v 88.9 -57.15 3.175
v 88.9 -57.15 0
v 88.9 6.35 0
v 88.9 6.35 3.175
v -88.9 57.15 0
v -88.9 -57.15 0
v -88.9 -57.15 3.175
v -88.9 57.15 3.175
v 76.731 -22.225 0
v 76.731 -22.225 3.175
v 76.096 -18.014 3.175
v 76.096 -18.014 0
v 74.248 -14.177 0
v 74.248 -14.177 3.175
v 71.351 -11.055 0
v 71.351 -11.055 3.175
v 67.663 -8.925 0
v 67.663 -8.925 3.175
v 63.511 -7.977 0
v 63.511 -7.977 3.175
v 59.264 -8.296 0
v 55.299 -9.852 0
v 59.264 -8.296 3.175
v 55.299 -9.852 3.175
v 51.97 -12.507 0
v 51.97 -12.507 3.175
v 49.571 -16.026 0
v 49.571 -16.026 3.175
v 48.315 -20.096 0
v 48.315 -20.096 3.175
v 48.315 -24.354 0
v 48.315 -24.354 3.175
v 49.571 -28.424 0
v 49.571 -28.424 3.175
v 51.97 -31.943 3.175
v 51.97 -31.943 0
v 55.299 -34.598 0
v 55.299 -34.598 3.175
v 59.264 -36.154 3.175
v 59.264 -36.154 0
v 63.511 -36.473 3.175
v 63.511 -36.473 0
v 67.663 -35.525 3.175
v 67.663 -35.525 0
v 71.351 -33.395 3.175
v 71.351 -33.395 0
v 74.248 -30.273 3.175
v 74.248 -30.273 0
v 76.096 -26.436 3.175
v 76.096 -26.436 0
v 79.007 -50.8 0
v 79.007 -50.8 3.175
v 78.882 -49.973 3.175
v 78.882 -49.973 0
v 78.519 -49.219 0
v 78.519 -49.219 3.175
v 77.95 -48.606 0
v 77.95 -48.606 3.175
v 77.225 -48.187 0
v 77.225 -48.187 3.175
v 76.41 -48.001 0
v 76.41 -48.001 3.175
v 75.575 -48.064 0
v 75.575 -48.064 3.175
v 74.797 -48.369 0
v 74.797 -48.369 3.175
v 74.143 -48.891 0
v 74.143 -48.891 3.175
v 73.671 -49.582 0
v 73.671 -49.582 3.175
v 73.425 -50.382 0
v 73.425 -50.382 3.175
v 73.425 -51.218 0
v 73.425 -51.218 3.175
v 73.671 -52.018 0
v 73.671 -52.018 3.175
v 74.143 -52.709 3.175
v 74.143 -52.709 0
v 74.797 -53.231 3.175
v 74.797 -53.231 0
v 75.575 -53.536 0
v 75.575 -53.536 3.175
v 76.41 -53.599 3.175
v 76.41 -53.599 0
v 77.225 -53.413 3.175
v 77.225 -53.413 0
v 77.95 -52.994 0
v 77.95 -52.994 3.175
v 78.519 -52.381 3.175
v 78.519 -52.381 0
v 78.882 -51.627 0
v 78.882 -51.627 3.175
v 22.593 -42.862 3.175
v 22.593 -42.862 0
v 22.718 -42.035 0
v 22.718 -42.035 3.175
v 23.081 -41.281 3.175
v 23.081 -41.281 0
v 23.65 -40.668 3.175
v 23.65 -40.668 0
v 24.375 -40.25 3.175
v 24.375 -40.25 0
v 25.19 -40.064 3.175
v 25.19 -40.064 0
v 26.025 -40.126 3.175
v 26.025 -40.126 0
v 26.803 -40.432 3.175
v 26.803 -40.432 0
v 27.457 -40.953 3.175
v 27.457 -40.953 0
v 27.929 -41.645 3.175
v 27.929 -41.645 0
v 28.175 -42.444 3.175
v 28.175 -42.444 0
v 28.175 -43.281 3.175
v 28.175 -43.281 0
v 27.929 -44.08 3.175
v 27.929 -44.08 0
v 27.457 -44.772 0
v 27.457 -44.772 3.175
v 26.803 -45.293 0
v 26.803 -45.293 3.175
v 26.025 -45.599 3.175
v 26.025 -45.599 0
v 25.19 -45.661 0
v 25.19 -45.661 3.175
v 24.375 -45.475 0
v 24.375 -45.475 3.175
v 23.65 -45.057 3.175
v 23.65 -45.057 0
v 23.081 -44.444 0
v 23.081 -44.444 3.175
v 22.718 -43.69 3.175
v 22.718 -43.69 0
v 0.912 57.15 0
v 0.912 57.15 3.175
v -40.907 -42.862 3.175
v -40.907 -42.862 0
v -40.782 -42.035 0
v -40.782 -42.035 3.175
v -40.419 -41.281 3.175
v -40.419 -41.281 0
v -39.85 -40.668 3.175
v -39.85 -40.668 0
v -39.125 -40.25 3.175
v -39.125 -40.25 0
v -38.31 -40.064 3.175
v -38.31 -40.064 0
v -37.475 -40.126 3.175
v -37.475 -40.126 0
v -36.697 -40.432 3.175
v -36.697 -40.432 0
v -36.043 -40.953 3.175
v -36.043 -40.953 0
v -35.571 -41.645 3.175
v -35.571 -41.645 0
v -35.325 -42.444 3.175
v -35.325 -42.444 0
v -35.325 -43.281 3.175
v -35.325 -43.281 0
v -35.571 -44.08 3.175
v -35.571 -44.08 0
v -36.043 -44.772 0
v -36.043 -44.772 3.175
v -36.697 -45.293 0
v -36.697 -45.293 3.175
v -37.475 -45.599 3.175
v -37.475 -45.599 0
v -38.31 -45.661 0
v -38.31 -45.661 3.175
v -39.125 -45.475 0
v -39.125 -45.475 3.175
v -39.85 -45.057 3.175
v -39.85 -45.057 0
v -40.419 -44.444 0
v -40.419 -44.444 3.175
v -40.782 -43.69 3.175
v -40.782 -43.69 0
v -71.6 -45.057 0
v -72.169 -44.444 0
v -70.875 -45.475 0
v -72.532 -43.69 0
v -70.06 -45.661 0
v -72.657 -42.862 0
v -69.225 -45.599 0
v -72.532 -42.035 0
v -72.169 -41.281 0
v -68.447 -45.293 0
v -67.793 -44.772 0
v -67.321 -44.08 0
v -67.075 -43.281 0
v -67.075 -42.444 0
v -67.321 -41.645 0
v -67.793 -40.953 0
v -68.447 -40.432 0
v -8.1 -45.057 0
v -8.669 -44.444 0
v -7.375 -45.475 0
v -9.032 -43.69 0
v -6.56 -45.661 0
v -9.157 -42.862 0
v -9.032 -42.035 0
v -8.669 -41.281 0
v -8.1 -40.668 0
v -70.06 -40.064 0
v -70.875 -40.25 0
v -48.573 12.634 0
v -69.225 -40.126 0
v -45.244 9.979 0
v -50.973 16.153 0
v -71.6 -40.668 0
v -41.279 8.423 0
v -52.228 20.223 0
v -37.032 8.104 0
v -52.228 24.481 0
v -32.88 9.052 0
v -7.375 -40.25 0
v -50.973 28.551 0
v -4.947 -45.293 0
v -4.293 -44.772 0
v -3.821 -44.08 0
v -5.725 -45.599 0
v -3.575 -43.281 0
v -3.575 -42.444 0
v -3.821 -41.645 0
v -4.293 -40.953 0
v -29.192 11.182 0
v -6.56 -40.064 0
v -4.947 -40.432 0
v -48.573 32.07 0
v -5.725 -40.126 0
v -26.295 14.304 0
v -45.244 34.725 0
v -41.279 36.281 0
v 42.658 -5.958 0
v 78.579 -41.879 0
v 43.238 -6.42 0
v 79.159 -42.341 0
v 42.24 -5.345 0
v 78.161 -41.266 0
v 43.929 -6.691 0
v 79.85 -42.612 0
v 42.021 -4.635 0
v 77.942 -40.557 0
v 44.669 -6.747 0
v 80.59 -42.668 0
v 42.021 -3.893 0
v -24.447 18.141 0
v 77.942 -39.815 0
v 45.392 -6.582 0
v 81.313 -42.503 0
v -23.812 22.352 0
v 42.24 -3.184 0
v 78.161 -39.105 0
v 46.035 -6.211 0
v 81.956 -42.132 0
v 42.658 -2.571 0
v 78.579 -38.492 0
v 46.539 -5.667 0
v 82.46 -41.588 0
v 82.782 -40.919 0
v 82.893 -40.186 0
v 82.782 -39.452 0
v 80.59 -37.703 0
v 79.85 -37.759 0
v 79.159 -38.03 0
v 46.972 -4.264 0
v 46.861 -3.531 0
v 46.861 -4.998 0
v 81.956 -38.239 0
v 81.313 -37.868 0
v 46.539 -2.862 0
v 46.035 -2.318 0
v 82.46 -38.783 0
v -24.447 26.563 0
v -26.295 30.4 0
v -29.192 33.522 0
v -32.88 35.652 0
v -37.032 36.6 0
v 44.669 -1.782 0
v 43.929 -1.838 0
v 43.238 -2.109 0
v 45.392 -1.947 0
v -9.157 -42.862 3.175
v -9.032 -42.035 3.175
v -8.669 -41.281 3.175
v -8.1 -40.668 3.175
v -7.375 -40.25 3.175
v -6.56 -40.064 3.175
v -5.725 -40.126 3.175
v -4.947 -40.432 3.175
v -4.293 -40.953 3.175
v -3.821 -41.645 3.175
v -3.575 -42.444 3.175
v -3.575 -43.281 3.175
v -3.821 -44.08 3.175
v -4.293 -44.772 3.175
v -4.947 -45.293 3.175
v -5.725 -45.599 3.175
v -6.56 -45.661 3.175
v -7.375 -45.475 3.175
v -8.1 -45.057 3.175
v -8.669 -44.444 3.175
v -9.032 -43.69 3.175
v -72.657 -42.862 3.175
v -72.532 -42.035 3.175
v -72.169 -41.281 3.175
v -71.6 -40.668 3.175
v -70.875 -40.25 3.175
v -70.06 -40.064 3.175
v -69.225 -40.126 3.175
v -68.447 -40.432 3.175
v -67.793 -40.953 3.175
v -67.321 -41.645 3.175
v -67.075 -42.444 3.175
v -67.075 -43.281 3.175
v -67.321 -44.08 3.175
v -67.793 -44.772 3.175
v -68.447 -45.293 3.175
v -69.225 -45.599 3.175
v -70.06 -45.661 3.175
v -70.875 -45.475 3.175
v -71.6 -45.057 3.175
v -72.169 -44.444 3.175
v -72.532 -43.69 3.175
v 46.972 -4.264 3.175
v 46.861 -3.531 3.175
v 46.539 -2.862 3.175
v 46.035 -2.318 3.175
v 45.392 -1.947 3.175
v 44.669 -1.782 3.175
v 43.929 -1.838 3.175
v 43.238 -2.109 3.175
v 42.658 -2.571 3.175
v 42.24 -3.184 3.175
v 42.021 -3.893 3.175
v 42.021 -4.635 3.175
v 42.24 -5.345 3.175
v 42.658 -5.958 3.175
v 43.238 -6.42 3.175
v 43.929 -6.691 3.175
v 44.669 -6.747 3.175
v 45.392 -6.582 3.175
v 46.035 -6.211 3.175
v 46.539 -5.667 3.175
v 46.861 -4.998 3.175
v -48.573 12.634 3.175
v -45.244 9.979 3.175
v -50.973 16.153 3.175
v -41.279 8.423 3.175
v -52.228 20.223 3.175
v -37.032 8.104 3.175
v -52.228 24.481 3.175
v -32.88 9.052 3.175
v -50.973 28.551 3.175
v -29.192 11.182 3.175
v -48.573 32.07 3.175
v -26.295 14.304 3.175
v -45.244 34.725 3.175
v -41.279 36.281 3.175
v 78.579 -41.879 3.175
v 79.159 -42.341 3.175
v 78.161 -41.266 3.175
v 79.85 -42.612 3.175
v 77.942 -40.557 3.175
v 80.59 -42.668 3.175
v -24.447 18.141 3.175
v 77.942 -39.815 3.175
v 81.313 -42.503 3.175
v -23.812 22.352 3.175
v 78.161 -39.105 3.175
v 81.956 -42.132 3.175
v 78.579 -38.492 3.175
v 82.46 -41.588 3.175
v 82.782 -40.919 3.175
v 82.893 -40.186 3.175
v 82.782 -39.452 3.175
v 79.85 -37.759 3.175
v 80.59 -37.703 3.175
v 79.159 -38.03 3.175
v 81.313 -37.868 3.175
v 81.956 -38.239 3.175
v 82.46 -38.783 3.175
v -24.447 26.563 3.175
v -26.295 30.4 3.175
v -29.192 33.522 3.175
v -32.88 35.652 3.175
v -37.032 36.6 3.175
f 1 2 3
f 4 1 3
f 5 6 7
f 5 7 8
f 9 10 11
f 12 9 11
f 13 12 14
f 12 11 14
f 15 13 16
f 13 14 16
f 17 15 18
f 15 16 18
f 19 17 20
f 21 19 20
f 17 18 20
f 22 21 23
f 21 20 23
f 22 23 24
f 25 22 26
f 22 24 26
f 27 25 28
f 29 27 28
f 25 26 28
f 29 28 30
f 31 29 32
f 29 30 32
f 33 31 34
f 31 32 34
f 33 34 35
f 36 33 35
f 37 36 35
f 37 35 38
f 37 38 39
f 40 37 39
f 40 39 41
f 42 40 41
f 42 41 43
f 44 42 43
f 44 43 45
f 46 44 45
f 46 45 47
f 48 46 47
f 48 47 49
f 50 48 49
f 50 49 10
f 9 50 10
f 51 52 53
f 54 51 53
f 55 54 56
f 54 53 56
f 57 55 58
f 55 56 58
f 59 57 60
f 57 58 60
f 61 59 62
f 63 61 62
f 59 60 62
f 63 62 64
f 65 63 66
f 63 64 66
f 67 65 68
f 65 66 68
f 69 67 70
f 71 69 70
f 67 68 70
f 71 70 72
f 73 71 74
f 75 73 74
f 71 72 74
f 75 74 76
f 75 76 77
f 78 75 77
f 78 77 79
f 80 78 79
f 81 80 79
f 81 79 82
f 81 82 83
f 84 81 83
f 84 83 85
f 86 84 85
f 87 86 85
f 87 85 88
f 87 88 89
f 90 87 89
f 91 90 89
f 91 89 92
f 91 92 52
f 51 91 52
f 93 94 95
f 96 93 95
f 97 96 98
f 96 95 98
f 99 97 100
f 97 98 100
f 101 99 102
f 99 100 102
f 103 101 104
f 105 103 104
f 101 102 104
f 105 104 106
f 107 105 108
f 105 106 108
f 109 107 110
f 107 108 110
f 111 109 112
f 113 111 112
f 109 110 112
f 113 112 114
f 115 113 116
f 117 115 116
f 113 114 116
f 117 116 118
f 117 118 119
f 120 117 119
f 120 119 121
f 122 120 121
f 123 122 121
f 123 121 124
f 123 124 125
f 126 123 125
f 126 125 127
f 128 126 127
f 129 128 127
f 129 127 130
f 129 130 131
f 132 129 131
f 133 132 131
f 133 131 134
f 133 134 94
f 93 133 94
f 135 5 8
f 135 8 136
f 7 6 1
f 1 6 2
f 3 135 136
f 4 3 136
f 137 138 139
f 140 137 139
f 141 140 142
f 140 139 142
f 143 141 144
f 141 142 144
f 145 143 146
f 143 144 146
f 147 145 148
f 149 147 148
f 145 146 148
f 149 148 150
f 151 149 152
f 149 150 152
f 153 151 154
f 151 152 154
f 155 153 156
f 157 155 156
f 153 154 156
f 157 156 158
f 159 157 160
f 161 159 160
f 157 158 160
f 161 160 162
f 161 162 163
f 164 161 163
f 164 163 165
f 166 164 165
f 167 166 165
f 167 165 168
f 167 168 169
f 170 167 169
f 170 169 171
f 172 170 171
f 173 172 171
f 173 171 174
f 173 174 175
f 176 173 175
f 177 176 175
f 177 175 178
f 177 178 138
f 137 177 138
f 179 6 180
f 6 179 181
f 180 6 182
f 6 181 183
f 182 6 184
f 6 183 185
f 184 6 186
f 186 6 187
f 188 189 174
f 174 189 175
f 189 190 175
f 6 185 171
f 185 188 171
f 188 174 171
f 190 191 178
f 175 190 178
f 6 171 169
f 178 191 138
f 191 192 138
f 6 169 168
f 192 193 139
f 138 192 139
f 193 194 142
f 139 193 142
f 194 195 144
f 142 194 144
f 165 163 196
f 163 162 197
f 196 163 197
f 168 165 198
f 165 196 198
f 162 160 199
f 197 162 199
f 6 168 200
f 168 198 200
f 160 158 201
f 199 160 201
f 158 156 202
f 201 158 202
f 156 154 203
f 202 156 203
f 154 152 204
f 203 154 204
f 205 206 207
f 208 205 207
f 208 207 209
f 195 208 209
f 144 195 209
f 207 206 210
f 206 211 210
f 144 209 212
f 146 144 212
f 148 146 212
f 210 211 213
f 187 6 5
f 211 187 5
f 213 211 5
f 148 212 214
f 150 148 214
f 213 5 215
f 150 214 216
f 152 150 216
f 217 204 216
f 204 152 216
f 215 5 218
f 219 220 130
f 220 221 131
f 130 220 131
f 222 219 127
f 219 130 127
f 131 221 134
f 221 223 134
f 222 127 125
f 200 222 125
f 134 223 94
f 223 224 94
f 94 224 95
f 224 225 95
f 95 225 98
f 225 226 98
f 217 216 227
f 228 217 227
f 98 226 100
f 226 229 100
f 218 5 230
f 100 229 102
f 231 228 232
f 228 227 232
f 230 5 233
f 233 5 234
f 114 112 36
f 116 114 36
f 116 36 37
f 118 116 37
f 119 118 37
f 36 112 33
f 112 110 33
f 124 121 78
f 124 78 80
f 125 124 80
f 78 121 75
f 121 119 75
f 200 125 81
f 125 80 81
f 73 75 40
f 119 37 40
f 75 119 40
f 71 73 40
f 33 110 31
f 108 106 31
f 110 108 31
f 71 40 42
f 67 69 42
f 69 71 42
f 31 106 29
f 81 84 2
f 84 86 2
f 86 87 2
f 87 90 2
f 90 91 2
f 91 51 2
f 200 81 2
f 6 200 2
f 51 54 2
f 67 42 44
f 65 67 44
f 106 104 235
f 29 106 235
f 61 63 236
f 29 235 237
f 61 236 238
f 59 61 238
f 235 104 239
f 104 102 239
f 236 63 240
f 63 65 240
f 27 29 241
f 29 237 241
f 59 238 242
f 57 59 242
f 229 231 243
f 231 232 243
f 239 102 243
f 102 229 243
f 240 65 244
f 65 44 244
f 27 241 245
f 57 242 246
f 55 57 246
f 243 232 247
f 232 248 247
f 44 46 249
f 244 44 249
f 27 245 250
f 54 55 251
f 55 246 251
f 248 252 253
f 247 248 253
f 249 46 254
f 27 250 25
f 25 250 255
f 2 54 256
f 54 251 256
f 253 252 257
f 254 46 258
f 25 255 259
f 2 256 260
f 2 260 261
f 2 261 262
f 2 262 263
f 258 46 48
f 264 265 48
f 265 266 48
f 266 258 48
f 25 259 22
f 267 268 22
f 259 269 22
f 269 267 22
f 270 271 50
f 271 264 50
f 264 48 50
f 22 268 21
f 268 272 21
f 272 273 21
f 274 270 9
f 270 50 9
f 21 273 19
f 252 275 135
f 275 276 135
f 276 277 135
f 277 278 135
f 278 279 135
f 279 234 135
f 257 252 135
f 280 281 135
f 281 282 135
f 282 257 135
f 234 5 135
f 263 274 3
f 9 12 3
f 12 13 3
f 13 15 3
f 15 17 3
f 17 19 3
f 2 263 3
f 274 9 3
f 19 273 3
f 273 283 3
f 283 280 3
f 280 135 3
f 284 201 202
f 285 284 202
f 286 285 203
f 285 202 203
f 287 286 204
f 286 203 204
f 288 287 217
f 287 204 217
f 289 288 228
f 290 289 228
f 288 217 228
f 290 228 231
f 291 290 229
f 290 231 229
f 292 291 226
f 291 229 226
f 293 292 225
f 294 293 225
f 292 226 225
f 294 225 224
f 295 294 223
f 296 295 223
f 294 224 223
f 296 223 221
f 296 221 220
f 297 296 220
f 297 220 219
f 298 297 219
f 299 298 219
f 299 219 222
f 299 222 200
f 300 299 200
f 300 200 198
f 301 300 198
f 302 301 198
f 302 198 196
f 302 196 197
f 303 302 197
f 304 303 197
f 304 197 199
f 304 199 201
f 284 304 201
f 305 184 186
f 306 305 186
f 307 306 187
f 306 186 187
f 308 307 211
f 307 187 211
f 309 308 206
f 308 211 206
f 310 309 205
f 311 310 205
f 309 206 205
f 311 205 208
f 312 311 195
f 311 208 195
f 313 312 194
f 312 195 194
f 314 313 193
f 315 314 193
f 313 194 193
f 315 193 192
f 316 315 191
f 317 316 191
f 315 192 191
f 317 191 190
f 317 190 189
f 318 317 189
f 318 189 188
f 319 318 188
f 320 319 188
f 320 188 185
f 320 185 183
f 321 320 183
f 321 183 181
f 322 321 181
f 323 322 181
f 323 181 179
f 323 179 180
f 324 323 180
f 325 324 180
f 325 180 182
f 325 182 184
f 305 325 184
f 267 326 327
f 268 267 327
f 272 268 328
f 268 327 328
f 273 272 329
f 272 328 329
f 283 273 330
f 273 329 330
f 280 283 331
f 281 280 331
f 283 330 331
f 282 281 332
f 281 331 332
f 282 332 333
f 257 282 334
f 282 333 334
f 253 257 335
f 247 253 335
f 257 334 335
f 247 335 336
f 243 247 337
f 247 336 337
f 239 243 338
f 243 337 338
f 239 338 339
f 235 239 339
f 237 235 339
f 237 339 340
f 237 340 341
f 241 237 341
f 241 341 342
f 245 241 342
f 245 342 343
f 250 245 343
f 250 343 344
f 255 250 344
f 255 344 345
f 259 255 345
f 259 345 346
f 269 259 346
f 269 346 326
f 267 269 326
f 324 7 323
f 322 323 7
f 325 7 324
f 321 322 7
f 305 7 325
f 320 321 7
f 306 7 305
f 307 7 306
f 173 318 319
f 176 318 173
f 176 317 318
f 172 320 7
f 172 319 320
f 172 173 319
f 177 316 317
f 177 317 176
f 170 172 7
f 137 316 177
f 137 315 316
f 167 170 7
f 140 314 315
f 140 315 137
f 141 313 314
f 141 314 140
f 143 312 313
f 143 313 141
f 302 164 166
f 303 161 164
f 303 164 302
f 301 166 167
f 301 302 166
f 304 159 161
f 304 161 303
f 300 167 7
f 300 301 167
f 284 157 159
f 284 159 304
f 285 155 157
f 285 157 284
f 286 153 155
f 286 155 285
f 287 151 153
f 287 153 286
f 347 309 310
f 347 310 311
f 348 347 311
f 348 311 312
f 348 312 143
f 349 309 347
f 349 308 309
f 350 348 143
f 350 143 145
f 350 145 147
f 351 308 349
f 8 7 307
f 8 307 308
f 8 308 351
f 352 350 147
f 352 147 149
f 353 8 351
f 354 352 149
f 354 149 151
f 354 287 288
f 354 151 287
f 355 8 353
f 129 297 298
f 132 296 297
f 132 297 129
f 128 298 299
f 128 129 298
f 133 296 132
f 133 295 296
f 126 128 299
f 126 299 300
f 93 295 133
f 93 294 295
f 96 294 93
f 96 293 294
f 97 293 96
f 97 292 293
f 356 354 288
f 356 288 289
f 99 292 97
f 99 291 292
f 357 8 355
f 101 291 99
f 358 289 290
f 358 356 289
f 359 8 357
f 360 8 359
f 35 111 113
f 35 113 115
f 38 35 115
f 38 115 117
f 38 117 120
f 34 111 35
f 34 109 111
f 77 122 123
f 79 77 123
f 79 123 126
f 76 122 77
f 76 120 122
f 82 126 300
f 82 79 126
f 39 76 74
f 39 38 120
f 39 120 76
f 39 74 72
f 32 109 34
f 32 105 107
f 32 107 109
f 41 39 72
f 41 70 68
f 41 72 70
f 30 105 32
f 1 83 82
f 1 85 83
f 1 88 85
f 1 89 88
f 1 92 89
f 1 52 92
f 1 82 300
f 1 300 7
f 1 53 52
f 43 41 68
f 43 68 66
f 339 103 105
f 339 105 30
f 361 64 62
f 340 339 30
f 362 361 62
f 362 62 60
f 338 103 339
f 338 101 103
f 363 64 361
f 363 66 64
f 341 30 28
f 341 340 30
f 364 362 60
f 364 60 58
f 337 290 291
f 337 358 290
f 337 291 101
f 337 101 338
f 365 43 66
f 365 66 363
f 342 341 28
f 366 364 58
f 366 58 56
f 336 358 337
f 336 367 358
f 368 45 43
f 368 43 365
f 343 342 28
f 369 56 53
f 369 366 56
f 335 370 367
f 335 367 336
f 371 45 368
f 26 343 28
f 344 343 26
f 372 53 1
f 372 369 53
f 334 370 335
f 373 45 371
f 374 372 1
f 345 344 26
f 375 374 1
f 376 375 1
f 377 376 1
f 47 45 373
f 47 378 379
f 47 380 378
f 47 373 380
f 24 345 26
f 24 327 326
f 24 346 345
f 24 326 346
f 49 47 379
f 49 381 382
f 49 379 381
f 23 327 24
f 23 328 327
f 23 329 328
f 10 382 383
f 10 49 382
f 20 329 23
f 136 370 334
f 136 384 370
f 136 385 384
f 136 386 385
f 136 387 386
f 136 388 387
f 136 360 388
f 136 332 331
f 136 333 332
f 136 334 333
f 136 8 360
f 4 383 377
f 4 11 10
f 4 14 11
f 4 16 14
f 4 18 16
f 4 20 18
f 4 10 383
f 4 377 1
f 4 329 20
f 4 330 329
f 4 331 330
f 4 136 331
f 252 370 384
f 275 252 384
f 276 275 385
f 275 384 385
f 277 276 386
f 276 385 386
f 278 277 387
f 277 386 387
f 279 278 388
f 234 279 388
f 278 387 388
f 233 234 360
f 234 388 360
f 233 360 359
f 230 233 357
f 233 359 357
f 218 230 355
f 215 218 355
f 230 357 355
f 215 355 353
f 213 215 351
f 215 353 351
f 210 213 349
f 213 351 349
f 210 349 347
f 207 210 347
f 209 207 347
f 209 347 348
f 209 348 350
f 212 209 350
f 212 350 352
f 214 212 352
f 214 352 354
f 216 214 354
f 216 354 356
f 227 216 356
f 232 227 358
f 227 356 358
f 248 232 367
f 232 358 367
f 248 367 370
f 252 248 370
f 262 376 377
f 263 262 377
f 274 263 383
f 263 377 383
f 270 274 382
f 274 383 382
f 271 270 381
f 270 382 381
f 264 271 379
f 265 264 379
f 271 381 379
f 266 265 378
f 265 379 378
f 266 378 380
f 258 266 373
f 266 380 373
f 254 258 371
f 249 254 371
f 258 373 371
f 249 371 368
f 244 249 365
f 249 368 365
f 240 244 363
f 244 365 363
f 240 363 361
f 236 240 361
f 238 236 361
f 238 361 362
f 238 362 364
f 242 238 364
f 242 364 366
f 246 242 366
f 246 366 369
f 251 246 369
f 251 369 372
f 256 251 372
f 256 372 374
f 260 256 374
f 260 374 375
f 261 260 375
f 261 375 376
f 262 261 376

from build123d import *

# Parameters (mm, degrees)
SKETCH1_W              = 177.8
SKETCH1_H              = 114.3
BOSS_EXTRUDE1_DEPTH    = 3.175
SKETCH2_R              = 14.2875
CUT_EXTRUDE1_DEPTH     = 3.175
F_10_CLEARANCE_HOLE1_D = 5.6134
SKETCH5_R              = 14.2875
SKETCH5_R_2            = 2.4892
CUT_EXTRUDE2_DEPTH     = 4.175
CHAMFER1_SIZE          = 50.8
CHAMFER1_SIZE2         = 87.988181024
F_10_CLEARANCE_HOLE2_D = 5.6134


with BuildPart() as part:
    # Sketch1 → Boss-Extrude1 (new body)
    with BuildSketch(Plane.XY):
        Rectangle(SKETCH1_W, SKETCH1_H)
    extrude(amount=BOSS_EXTRUDE1_DEPTH)

    # Sketch2 → Cut-Extrude1 (cut)
    with BuildSketch(Plane.XY.offset(3.175)):
        with Locations((-38.1, 22.352)):
            Circle(SKETCH2_R)
    extrude(amount=-CUT_EXTRUDE1_DEPTH, mode=Mode.SUBTRACT)

    # #10 Clearance Hole1 (through all)
    with Locations(Plane.XY.offset(3.175)):
        with Locations((-69.85, -42.8625), (-38.1, -42.8625), (-6.35, -42.8625), (25.4, -42.8625)):
            Hole(F_10_CLEARANCE_HOLE1_D / 2)

    # Sketch5 → Cut-Extrude2 (cut, through all)
    with BuildSketch(Plane.XY.offset(3.175)):
        with Locations((62.443181743, -22.225)):
            Circle(SKETCH5_R)
        with Locations((44.482669501, -4.264487758)):
            Circle(SKETCH5_R_2)
        with Locations((80.403693985, -40.185512242)):
            Circle(SKETCH5_R_2)
    extrude(amount=-CUT_EXTRUDE2_DEPTH, mode=Mode.SUBTRACT)

    # Chamfer1
    chamfer1_edges = [part.edges().sort_by_distance(p)[0] for p in [
        (88.9, 57.15, 1.5875),
    ]]
    chamfer1_side = [part.faces().sort_by_distance(p)[0] for p in [
        (88.9, 0, 1.5875),
    ]]
    chamfer(chamfer1_edges, length=CHAMFER1_SIZE, length2=CHAMFER1_SIZE2, reference=chamfer1_side[0])

    # #10 Clearance Hole2 (through all)
    with Locations(Plane(origin=(0, 0, 0), x_dir=(-1, 0, 0), z_dir=(0, 0, -1))):
        with Locations((-76.2, -50.8)):
            Hole(F_10_CLEARANCE_HOLE2_D / 2)


solid = part.part
